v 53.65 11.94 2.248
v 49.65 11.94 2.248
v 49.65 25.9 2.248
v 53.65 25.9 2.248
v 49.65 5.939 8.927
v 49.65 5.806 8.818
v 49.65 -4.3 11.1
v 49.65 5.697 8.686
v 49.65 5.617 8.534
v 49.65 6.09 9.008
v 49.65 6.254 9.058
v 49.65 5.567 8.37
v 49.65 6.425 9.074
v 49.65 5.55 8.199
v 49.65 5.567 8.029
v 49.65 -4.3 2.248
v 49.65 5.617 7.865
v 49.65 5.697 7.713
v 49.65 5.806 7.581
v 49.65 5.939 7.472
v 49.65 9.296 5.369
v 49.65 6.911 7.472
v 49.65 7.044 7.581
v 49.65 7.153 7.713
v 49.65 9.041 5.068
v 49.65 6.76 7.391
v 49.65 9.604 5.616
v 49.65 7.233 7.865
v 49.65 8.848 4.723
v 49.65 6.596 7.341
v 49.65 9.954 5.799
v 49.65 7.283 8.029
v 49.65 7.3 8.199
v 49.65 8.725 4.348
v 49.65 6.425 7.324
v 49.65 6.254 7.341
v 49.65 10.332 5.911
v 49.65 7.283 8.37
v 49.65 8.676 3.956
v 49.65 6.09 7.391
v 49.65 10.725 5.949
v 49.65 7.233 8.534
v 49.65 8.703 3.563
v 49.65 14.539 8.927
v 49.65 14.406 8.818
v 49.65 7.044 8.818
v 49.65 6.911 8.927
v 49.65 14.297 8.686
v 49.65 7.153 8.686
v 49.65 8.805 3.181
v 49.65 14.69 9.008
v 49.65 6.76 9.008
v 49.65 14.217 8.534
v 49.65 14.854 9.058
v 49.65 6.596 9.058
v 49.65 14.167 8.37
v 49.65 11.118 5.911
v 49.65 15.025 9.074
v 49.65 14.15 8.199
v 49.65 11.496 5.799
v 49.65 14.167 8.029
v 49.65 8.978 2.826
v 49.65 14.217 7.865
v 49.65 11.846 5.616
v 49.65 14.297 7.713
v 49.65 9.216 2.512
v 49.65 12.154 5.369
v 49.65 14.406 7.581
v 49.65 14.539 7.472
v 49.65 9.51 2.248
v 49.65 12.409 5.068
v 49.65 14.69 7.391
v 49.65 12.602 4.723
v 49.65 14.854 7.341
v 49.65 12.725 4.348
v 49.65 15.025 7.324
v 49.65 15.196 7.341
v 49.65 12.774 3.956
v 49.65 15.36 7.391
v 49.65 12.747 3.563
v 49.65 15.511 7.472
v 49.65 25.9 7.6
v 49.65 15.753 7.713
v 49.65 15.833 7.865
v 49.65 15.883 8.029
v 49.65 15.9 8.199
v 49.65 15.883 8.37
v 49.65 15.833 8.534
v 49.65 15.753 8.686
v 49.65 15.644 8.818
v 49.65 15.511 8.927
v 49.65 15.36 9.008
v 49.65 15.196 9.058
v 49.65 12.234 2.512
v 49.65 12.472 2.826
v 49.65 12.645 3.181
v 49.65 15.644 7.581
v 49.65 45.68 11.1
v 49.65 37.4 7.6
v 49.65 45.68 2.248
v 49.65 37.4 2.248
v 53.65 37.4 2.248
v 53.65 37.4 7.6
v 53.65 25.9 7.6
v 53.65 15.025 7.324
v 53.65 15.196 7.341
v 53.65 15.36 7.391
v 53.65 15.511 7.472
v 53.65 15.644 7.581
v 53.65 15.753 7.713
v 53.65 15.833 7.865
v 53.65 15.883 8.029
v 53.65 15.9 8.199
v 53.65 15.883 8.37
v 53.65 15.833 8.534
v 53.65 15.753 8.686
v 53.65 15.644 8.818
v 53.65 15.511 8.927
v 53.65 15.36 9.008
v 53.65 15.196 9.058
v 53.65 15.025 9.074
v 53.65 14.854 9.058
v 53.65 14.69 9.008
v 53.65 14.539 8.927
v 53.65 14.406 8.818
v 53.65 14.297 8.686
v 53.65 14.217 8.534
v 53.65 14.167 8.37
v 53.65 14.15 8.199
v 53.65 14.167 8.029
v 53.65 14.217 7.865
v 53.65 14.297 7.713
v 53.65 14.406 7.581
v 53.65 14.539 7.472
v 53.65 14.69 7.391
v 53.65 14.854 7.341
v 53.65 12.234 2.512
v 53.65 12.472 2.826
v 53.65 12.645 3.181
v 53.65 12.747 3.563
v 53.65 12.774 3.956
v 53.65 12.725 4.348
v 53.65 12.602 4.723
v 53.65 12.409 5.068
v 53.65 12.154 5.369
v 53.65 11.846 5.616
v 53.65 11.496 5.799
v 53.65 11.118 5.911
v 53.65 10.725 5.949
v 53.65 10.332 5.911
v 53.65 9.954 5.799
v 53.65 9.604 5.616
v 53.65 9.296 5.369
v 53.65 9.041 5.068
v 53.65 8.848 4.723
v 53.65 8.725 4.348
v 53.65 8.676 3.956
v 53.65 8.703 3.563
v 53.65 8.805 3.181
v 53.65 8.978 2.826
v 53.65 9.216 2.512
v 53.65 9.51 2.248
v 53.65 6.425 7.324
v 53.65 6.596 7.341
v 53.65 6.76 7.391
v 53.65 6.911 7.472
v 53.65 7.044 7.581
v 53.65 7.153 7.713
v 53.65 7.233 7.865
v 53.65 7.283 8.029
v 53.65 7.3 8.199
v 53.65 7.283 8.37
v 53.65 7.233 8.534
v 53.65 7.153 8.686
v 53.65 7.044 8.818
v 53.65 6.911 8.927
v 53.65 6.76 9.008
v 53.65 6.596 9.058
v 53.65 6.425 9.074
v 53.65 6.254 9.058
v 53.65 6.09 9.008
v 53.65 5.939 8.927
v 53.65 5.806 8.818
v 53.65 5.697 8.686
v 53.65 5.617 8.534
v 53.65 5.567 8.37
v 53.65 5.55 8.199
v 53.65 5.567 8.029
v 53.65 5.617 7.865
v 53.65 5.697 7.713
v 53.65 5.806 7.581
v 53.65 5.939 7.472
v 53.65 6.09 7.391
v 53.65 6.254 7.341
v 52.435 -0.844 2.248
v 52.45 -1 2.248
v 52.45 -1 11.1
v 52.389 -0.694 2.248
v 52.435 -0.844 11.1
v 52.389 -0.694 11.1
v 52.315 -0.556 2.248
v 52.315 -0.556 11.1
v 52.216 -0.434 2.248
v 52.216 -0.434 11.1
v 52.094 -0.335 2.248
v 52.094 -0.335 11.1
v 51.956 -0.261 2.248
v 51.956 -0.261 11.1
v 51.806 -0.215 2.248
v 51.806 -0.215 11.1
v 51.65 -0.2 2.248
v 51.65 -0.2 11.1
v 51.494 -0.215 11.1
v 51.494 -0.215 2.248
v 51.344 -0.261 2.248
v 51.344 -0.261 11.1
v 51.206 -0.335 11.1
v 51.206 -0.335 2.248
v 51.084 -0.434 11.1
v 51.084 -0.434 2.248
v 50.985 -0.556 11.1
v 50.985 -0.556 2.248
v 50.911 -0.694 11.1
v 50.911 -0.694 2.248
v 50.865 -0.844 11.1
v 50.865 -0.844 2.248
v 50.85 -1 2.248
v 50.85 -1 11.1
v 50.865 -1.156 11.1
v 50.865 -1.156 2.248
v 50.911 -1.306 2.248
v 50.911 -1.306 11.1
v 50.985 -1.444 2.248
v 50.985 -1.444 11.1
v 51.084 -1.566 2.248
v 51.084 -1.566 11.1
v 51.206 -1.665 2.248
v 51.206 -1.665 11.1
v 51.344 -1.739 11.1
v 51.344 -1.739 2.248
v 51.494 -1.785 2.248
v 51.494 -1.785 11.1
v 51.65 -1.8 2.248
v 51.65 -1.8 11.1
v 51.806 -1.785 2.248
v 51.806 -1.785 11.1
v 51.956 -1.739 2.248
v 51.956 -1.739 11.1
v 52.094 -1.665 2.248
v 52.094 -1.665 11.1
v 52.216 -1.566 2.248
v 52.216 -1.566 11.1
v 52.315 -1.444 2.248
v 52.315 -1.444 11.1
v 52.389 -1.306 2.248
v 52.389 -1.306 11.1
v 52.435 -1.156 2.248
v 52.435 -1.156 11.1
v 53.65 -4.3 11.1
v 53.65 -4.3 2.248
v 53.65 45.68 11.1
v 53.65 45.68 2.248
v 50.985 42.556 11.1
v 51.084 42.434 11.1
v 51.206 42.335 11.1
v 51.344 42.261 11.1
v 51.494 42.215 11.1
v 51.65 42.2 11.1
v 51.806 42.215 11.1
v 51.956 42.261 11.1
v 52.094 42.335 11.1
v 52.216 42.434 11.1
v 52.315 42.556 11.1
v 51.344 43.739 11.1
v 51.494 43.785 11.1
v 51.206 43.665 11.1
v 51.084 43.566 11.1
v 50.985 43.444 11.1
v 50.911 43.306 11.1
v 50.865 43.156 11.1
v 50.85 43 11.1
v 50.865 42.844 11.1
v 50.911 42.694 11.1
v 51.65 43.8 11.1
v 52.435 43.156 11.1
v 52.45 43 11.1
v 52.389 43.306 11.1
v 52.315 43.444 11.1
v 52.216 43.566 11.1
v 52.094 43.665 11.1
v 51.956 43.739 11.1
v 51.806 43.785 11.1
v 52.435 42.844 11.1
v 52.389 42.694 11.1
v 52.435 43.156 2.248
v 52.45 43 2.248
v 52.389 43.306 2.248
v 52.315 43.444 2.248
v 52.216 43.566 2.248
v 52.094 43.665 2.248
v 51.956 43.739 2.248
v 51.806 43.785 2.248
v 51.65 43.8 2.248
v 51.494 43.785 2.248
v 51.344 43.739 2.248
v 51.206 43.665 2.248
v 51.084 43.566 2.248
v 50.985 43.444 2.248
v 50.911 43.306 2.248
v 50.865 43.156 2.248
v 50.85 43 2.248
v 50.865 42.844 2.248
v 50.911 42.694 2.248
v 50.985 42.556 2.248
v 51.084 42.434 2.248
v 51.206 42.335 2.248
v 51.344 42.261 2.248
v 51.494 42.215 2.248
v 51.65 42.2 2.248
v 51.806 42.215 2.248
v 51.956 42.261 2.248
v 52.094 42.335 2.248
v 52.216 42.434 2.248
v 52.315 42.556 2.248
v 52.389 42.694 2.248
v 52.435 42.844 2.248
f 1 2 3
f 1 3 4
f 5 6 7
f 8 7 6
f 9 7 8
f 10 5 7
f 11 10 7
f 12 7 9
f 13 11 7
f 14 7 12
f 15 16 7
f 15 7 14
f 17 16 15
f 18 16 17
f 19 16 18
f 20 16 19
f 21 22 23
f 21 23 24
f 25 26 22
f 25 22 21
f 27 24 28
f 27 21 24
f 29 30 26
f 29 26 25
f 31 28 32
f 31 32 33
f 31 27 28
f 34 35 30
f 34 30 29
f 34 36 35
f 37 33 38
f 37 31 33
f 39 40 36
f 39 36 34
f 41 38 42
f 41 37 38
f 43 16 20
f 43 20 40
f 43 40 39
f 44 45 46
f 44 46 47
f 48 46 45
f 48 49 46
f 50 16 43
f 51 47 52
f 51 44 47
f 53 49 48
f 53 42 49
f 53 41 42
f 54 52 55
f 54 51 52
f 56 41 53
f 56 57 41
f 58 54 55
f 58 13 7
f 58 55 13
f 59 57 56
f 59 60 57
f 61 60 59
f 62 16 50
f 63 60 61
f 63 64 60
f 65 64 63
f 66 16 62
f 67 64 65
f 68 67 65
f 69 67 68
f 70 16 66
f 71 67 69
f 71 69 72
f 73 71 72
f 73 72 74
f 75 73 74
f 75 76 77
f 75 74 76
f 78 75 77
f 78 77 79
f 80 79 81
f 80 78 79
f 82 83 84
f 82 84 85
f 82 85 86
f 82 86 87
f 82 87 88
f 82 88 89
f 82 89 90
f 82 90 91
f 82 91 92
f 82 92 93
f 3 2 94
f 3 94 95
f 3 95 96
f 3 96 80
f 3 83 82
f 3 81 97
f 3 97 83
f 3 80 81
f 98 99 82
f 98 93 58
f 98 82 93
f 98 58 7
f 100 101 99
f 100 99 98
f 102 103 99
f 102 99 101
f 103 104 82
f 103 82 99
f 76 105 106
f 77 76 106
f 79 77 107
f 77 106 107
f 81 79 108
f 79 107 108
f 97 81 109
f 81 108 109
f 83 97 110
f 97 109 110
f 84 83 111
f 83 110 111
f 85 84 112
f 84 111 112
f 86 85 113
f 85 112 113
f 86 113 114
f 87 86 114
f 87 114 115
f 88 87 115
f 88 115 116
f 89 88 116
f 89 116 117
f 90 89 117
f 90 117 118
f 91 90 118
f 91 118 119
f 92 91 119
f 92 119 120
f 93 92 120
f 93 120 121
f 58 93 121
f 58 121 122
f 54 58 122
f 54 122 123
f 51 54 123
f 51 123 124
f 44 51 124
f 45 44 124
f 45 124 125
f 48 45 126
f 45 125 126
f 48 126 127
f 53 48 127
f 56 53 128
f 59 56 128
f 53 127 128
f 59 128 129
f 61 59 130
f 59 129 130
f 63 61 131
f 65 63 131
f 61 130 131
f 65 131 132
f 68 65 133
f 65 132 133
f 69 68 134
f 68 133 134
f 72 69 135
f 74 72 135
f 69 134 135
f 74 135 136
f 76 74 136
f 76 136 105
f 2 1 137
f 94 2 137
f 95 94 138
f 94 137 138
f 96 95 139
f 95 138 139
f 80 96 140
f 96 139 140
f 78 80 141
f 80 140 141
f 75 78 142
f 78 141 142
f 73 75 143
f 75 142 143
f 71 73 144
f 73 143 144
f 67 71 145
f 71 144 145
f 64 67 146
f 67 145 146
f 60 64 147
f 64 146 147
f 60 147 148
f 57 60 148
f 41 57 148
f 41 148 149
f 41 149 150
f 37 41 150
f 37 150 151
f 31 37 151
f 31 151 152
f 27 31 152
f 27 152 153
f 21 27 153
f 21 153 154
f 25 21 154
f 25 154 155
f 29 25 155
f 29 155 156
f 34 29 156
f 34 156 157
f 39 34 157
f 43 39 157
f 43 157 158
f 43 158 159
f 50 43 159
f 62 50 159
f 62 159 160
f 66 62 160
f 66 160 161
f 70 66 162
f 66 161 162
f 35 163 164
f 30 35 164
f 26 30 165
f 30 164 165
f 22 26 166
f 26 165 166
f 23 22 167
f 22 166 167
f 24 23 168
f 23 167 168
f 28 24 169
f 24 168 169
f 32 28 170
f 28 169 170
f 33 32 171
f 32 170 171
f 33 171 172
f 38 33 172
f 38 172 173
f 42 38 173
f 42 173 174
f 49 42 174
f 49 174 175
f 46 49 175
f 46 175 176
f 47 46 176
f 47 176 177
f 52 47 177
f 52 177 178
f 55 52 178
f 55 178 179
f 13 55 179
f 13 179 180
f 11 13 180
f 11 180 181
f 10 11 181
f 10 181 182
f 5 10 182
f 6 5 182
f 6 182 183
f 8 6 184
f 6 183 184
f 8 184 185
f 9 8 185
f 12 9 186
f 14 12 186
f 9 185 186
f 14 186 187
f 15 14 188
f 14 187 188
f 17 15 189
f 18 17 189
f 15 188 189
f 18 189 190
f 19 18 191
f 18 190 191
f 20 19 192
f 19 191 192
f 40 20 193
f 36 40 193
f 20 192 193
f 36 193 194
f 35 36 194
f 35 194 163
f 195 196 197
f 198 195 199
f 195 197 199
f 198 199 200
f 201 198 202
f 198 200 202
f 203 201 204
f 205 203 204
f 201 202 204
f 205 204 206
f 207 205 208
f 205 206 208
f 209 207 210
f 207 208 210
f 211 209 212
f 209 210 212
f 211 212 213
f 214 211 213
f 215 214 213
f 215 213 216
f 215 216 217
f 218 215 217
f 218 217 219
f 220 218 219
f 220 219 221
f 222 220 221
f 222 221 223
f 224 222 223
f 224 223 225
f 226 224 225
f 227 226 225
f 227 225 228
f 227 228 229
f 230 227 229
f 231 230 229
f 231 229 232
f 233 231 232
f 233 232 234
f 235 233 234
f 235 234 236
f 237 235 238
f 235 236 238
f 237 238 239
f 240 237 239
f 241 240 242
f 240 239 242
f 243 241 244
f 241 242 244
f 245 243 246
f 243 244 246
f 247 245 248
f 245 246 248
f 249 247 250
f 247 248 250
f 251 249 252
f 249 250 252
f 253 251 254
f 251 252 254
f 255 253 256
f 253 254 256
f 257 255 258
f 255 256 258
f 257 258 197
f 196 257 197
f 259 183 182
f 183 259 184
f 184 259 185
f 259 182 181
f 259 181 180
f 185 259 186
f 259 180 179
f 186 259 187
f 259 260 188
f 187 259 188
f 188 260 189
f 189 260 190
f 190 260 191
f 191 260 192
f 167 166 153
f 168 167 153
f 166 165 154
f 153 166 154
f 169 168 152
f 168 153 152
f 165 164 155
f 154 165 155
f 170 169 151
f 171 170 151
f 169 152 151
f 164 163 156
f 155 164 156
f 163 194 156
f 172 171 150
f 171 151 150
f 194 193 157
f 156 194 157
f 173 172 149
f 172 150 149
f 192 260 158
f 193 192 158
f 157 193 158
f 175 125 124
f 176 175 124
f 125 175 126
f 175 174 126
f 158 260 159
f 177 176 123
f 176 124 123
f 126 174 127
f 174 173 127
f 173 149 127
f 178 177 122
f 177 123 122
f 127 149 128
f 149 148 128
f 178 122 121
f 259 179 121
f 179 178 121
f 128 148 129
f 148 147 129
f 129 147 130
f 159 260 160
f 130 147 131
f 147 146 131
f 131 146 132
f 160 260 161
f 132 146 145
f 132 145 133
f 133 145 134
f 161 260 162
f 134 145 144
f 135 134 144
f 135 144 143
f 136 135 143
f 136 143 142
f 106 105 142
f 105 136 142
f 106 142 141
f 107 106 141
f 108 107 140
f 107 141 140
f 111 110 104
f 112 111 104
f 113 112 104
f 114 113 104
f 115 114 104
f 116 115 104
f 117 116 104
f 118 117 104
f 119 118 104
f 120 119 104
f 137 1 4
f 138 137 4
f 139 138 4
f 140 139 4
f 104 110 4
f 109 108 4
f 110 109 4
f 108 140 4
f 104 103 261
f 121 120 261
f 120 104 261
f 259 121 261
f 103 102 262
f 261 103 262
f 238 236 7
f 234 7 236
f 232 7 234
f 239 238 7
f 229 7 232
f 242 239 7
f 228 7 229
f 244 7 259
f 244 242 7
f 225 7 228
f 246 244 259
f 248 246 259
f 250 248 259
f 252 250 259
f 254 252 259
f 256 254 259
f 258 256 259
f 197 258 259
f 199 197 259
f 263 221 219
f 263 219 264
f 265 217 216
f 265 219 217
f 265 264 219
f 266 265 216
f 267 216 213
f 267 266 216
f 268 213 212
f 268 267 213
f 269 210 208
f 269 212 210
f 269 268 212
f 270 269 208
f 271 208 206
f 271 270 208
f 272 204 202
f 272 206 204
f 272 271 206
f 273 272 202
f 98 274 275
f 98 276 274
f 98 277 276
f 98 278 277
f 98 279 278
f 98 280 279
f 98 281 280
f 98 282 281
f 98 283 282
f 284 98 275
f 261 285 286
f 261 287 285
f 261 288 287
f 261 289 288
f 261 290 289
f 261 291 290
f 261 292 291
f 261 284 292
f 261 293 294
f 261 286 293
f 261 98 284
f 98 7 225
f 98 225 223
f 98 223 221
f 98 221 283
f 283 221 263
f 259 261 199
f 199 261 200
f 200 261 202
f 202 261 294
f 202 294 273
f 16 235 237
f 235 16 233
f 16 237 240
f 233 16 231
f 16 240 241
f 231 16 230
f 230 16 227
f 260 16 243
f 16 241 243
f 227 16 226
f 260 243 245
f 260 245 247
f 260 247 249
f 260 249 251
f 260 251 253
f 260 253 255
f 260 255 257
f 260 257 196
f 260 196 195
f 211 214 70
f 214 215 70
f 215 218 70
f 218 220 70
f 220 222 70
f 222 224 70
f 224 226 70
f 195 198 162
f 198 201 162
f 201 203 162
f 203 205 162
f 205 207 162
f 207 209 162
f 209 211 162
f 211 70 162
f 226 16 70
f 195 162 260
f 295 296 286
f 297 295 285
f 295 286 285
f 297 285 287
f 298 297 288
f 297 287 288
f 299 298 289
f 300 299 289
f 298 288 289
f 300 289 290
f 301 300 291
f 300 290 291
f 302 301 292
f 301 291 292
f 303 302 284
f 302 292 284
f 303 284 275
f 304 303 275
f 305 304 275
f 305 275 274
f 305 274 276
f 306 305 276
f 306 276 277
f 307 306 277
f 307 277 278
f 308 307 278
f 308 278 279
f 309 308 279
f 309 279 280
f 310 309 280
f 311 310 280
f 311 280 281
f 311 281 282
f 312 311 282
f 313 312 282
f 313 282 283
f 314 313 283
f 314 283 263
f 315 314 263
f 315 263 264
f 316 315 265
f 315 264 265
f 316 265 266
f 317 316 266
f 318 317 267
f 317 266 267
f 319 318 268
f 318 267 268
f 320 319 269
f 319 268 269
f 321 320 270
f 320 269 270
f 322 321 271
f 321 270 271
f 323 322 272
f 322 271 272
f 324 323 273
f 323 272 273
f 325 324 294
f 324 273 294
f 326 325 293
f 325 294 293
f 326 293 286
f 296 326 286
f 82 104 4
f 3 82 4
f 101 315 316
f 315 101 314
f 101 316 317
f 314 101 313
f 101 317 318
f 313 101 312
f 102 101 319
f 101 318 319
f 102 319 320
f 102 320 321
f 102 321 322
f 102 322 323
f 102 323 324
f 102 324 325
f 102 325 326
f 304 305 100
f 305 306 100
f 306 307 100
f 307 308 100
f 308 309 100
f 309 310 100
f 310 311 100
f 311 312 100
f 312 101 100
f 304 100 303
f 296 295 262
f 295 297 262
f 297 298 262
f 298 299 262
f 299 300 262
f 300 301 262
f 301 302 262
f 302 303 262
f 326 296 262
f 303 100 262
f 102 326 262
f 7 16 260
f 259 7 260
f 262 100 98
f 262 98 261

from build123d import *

# Parameters (mm, degrees)
SKETCH_1_W                      = 4
SKETCH_1_H                      = 49.98
RIGHT_RF_PLATE_DEPTH            = 8.851909566
SKETCH_2_R                      = 0.8
FRAME_2XD1P6_THROUGH_DEPTH      = 72.016485431
SKETCH_3_R                      = 2.05
SMA_CENTER_D4P1_DEPTH           = 4
SKETCH_4_R                      = 0.875
SMA_UPPER_2XD1P75_THROUGH_DEPTH = 48.179152176
SKETCH_5_W                      = 6.7
SKETCH_5_H                      = 11.5
TYPEC_WINDOW_11P5X6P7_DEPTH     = 4


with BuildPart() as part:
    # 草图1 → Right_RF_Plate (new body)
    with BuildSketch(Plane.XY):
        with Locations((51.65, 20.69)):
            Rectangle(SKETCH_1_W, SKETCH_1_H)
    extrude(amount=RIGHT_RF_PLATE_DEPTH)


with BuildPart() as part_1:
    # Stock_Z_Position: moved
    add(part.part.moved(Location((0, 0, 2.248090434))))

    # 草图2 → Frame_2xD1p6_Through (cut, through all)
    with BuildSketch(Plane.XY.offset(11.1)):
        with Locations((51.65, -1)):
            Circle(SKETCH_2_R)
        with Locations((51.65, 43)):
            Circle(SKETCH_2_R)
    extrude(amount=-FRAME_2XD1P6_THROUGH_DEPTH, mode=Mode.SUBTRACT)

    # 草图3 → SMA_Center_D4p1 (cut)
    with BuildSketch(Plane(origin=(53.65, 0, 0), x_dir=(0, 0, -1), z_dir=(1, 0, 0))):
        with Locations((-3.899496327, 10.725)):
            Circle(SKETCH_3_R)
    extrude(amount=-SMA_CENTER_D4P1_DEPTH, mode=Mode.SUBTRACT)

    # 草图4 → SMA_Upper_2xD1p75_Through (cut, through all)
    with BuildSketch(Plane(origin=(53.65, 0, 0), x_dir=(0, 0, -1), z_dir=(1, 0, 0))):
        with Locations((-8.199496327, 6.425)):
            Circle(SKETCH_4_R)
        with Locations((-8.199496327, 15.025)):
            Circle(SKETCH_4_R)
    extrude(amount=-SMA_UPPER_2XD1P75_THROUGH_DEPTH, mode=Mode.SUBTRACT)

    # 草图5 → TypeC_Window_11p5x6p7 (cut)
    with BuildSketch(Plane(origin=(53.65, 0, 0), x_dir=(0, 0, -1), z_dir=(1, 0, 0))):
        with Locations((-4.25, 31.65)):
            Rectangle(SKETCH_5_W, SKETCH_5_H)
    extrude(amount=-TYPEC_WINDOW_11P5X6P7_DEPTH, mode=Mode.SUBTRACT)


solid = part_1.part
